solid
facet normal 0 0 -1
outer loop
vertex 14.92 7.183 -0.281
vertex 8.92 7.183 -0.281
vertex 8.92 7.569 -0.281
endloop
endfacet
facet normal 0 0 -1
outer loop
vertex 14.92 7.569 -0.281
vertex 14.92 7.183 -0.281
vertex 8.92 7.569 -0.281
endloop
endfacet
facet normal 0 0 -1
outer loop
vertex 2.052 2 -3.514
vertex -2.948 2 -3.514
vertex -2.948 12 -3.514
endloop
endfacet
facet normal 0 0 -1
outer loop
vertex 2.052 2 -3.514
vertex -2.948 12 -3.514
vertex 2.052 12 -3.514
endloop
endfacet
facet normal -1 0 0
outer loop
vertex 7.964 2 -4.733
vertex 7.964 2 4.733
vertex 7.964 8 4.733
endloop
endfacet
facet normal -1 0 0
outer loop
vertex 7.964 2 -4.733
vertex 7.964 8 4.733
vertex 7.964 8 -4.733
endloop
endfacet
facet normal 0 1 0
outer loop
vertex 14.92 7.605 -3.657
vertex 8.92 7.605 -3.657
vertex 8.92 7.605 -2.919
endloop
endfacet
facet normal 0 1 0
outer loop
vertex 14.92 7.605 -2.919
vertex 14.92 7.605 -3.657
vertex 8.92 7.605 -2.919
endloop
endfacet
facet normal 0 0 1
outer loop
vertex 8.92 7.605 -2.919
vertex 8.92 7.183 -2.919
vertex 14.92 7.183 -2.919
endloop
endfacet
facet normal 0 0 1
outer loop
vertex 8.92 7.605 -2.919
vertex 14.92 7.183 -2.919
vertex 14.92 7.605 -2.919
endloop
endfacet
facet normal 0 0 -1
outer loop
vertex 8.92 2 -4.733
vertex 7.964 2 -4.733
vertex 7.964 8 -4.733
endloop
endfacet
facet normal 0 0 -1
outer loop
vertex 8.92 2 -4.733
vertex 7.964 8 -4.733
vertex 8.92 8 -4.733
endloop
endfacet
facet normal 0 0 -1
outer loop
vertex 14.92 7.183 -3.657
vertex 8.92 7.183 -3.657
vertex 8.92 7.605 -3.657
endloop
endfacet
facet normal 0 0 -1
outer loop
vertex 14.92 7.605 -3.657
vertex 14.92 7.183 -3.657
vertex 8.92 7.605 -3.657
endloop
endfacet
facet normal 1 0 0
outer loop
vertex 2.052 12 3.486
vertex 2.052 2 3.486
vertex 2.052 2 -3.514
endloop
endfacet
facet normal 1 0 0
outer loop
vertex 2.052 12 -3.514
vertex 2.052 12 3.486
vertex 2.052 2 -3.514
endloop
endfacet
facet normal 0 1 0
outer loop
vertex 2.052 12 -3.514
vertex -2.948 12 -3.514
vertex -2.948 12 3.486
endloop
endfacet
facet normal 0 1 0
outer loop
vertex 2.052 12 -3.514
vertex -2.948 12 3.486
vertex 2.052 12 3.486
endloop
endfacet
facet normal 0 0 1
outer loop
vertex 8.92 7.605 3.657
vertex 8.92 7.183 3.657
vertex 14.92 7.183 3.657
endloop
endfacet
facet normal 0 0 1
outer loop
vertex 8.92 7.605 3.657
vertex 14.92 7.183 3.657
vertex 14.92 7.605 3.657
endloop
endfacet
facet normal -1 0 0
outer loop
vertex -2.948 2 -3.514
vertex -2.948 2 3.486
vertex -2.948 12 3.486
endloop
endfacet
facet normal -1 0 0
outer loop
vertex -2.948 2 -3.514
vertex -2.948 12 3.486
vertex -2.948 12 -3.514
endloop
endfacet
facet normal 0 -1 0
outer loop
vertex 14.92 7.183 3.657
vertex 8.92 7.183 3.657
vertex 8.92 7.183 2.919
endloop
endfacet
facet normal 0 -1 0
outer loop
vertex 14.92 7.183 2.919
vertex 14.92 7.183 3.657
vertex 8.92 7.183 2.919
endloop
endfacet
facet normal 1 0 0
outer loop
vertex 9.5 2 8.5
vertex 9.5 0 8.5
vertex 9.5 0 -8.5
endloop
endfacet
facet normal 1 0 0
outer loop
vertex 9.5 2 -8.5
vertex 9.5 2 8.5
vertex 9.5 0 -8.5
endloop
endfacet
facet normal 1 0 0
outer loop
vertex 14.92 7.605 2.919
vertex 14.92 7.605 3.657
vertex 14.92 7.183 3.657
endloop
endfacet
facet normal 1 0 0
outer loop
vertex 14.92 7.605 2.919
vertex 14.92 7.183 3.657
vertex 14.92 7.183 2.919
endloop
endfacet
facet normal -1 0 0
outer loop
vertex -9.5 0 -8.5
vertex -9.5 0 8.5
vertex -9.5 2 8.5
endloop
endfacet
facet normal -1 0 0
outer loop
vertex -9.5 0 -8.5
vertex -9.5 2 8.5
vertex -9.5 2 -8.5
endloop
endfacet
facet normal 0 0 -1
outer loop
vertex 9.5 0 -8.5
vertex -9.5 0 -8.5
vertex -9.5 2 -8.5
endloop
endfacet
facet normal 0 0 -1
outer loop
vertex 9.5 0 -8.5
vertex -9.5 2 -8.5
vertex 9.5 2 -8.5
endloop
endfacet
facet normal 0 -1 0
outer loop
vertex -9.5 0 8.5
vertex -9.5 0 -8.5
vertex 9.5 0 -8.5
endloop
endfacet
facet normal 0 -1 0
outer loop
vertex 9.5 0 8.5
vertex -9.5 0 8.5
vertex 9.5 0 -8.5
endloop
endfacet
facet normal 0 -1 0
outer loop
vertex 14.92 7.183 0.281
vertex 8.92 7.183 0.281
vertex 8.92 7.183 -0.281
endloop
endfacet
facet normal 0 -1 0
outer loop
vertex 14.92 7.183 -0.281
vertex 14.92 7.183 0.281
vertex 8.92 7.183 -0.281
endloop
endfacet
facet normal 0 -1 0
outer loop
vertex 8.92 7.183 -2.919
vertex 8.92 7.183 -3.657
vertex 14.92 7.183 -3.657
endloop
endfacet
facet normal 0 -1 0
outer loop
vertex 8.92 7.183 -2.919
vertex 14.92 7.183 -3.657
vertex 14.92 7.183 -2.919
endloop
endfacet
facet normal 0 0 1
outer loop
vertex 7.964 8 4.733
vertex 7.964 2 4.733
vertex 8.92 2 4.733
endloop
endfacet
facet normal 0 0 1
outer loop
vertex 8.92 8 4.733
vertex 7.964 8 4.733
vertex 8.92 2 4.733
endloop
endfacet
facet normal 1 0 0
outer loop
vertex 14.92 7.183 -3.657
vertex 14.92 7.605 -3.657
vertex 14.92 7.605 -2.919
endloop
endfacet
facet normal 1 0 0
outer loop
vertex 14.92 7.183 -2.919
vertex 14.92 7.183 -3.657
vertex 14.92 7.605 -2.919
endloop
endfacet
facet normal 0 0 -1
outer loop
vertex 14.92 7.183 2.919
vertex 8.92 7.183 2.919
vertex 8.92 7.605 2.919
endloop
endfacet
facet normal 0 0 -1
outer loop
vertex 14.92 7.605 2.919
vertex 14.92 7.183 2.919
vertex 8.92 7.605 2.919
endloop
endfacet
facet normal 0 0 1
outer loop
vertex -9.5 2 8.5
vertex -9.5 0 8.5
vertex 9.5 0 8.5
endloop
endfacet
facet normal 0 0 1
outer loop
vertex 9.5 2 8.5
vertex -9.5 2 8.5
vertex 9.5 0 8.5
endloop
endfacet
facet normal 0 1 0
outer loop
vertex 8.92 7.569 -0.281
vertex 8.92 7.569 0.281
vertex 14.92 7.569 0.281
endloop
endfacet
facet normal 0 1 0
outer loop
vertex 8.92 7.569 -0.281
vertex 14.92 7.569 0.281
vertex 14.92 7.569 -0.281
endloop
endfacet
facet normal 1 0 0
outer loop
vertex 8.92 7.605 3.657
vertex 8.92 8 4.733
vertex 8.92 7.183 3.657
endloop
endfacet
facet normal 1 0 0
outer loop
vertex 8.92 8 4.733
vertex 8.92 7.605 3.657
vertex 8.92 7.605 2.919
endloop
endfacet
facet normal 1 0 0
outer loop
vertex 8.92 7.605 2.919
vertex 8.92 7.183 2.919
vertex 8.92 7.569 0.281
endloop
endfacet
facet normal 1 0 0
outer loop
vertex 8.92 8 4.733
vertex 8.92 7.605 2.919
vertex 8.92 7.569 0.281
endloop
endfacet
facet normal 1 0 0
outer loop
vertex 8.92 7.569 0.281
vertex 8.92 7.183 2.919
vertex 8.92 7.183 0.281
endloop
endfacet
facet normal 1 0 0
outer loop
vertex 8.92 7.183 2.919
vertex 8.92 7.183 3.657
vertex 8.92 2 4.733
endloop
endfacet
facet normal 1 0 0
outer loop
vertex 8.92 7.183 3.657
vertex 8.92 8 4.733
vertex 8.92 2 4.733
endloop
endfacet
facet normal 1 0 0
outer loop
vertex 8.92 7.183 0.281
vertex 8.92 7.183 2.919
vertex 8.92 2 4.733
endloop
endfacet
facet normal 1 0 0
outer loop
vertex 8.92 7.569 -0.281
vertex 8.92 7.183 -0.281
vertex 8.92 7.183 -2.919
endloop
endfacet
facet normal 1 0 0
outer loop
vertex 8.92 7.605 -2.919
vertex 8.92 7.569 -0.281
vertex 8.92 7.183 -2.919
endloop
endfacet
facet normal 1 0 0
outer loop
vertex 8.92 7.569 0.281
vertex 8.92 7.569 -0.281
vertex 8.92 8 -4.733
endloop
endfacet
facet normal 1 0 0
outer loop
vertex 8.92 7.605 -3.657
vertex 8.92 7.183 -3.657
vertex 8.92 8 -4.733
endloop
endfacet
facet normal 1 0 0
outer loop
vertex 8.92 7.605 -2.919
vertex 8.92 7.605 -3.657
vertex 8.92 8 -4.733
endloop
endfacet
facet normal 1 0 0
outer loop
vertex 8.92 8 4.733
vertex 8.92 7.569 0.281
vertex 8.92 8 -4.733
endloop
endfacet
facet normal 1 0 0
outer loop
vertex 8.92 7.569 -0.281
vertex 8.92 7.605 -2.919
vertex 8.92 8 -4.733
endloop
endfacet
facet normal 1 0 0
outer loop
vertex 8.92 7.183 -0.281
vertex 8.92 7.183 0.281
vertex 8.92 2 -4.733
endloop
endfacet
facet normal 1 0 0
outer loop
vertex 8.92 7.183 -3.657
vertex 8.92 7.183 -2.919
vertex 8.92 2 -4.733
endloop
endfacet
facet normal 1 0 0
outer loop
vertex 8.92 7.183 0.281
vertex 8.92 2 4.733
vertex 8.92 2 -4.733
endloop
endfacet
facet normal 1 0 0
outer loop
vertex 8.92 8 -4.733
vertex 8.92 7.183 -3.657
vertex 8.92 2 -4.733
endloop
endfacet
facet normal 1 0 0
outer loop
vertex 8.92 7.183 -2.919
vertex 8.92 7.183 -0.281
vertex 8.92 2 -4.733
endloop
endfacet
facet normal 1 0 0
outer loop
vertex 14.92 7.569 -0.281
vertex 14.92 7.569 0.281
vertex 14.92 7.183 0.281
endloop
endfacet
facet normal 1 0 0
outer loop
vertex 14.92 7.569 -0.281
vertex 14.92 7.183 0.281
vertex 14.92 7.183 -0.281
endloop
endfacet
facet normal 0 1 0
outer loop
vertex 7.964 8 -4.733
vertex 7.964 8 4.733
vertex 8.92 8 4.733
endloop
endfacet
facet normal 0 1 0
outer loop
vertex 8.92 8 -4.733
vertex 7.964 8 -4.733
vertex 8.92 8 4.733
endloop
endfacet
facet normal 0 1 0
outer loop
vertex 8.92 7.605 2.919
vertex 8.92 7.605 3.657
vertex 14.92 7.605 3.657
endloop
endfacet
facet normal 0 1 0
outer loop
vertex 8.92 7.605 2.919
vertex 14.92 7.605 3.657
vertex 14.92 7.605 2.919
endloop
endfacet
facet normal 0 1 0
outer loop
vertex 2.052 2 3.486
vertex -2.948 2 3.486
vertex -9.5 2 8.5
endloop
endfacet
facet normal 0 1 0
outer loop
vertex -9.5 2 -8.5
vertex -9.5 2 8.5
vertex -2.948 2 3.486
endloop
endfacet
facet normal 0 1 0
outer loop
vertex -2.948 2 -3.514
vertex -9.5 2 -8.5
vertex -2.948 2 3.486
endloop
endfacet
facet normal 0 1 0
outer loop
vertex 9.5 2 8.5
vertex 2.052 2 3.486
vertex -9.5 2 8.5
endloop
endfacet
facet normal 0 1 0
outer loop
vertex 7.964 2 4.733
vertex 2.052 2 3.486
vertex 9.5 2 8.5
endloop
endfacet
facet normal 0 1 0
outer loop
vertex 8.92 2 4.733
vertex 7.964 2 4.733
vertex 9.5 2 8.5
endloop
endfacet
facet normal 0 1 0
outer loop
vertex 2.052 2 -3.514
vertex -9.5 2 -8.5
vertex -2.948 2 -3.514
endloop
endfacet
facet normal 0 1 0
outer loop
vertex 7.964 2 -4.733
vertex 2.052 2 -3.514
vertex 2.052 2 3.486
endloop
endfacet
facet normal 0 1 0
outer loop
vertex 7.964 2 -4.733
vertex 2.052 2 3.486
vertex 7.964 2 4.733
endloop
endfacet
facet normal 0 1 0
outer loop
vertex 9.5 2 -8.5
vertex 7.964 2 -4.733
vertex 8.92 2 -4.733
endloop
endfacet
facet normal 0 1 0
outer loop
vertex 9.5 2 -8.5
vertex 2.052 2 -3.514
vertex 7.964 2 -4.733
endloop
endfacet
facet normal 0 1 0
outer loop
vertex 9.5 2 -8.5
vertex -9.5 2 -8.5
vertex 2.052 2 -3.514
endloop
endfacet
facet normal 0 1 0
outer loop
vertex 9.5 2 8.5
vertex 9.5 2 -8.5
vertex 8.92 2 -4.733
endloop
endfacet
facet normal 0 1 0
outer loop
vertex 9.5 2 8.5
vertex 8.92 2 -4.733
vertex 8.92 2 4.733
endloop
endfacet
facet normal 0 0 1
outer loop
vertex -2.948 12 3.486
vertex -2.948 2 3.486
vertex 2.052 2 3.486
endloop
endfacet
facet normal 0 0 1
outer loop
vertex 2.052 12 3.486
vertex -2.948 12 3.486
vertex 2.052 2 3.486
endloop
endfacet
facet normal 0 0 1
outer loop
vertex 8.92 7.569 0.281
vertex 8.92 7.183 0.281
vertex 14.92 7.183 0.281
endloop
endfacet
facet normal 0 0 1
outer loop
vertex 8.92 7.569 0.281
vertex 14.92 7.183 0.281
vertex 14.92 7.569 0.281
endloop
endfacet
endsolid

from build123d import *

# Parameters (mm, degrees)
ESQUISSE1_W        = 19
ESQUISSE1_H        = 17
BOSS_EXTRU_1_DEPTH = 2
ESQUISSE2_W        = 0.955718941
ESQUISSE2_H        = 9.466168562
BOSS_EXTRU_2_DEPTH = 6
ESQUISSE3_W        = 0.738510091
ESQUISSE3_H        = 0.422005766
BOSS_EXTRU_3_DEPTH = 6
ESQUISSE4_W        = 0.562674356
ESQUISSE4_H        = 0.386838619
BOSS_EXTRU_4_DEPTH = 6
ESQUISSE5_W        = 5
ESQUISSE5_H        = 7
BOSS_EXTRU_5_DEPTH = 10


with BuildPart() as part:
    # Esquisse1 → Boss.-Extru.1 (new body)
    with BuildSketch(Plane(origin=(0, 0, 0), x_dir=(1, 0, 0), z_dir=(0, 1, 0))):
        Rectangle(ESQUISSE1_W, ESQUISSE1_H)
    extrude(amount=BOSS_EXTRU_1_DEPTH)

    # Esquisse2 → Boss.-Extru.2 (add)
    with BuildSketch(Plane(origin=(0, 2, 0), x_dir=(1, 0, 0), z_dir=(0, 1, 0))):
        with Locations((8.442183982, 0)):
            Rectangle(ESQUISSE2_W, ESQUISSE2_H)
    extrude(amount=BOSS_EXTRU_2_DEPTH)

    # Esquisse3 → Boss.-Extru.3 (add)
    with BuildSketch(Plane(origin=(8.920043452, 0, 0), x_dir=(0, 0, -1), z_dir=(1, 0, 0))):
        with Locations((-3.288128263, 7.393629704)):
            Rectangle(ESQUISSE3_W, ESQUISSE3_H)
    boss_extru_3 = extrude(amount=BOSS_EXTRU_3_DEPTH)

    # Symétrie1: Boss.-Extru.3 across plane
    add(boss_extru_3.mirror(Plane.XY))

    # Esquisse4 → Boss.-Extru.4 (add)
    with BuildSketch(Plane(origin=(8.920043452, 0, 0), x_dir=(0, 0, -1), z_dir=(1, 0, 0))):
        with Locations((0, 7.376046131)):
            Rectangle(ESQUISSE4_W, ESQUISSE4_H)
    extrude(amount=BOSS_EXTRU_4_DEPTH)

    # Esquisse5 → Boss.-Extru.5 (add)
    with BuildSketch(Plane(origin=(0, 2, 0), x_dir=(1, 0, 0), z_dir=(0, 1, 0))):
        with Locations((-0.447844474, 0.014350287)):
            Rectangle(ESQUISSE5_W, ESQUISSE5_H)
    extrude(amount=BOSS_EXTRU_5_DEPTH)


solid = part.part
